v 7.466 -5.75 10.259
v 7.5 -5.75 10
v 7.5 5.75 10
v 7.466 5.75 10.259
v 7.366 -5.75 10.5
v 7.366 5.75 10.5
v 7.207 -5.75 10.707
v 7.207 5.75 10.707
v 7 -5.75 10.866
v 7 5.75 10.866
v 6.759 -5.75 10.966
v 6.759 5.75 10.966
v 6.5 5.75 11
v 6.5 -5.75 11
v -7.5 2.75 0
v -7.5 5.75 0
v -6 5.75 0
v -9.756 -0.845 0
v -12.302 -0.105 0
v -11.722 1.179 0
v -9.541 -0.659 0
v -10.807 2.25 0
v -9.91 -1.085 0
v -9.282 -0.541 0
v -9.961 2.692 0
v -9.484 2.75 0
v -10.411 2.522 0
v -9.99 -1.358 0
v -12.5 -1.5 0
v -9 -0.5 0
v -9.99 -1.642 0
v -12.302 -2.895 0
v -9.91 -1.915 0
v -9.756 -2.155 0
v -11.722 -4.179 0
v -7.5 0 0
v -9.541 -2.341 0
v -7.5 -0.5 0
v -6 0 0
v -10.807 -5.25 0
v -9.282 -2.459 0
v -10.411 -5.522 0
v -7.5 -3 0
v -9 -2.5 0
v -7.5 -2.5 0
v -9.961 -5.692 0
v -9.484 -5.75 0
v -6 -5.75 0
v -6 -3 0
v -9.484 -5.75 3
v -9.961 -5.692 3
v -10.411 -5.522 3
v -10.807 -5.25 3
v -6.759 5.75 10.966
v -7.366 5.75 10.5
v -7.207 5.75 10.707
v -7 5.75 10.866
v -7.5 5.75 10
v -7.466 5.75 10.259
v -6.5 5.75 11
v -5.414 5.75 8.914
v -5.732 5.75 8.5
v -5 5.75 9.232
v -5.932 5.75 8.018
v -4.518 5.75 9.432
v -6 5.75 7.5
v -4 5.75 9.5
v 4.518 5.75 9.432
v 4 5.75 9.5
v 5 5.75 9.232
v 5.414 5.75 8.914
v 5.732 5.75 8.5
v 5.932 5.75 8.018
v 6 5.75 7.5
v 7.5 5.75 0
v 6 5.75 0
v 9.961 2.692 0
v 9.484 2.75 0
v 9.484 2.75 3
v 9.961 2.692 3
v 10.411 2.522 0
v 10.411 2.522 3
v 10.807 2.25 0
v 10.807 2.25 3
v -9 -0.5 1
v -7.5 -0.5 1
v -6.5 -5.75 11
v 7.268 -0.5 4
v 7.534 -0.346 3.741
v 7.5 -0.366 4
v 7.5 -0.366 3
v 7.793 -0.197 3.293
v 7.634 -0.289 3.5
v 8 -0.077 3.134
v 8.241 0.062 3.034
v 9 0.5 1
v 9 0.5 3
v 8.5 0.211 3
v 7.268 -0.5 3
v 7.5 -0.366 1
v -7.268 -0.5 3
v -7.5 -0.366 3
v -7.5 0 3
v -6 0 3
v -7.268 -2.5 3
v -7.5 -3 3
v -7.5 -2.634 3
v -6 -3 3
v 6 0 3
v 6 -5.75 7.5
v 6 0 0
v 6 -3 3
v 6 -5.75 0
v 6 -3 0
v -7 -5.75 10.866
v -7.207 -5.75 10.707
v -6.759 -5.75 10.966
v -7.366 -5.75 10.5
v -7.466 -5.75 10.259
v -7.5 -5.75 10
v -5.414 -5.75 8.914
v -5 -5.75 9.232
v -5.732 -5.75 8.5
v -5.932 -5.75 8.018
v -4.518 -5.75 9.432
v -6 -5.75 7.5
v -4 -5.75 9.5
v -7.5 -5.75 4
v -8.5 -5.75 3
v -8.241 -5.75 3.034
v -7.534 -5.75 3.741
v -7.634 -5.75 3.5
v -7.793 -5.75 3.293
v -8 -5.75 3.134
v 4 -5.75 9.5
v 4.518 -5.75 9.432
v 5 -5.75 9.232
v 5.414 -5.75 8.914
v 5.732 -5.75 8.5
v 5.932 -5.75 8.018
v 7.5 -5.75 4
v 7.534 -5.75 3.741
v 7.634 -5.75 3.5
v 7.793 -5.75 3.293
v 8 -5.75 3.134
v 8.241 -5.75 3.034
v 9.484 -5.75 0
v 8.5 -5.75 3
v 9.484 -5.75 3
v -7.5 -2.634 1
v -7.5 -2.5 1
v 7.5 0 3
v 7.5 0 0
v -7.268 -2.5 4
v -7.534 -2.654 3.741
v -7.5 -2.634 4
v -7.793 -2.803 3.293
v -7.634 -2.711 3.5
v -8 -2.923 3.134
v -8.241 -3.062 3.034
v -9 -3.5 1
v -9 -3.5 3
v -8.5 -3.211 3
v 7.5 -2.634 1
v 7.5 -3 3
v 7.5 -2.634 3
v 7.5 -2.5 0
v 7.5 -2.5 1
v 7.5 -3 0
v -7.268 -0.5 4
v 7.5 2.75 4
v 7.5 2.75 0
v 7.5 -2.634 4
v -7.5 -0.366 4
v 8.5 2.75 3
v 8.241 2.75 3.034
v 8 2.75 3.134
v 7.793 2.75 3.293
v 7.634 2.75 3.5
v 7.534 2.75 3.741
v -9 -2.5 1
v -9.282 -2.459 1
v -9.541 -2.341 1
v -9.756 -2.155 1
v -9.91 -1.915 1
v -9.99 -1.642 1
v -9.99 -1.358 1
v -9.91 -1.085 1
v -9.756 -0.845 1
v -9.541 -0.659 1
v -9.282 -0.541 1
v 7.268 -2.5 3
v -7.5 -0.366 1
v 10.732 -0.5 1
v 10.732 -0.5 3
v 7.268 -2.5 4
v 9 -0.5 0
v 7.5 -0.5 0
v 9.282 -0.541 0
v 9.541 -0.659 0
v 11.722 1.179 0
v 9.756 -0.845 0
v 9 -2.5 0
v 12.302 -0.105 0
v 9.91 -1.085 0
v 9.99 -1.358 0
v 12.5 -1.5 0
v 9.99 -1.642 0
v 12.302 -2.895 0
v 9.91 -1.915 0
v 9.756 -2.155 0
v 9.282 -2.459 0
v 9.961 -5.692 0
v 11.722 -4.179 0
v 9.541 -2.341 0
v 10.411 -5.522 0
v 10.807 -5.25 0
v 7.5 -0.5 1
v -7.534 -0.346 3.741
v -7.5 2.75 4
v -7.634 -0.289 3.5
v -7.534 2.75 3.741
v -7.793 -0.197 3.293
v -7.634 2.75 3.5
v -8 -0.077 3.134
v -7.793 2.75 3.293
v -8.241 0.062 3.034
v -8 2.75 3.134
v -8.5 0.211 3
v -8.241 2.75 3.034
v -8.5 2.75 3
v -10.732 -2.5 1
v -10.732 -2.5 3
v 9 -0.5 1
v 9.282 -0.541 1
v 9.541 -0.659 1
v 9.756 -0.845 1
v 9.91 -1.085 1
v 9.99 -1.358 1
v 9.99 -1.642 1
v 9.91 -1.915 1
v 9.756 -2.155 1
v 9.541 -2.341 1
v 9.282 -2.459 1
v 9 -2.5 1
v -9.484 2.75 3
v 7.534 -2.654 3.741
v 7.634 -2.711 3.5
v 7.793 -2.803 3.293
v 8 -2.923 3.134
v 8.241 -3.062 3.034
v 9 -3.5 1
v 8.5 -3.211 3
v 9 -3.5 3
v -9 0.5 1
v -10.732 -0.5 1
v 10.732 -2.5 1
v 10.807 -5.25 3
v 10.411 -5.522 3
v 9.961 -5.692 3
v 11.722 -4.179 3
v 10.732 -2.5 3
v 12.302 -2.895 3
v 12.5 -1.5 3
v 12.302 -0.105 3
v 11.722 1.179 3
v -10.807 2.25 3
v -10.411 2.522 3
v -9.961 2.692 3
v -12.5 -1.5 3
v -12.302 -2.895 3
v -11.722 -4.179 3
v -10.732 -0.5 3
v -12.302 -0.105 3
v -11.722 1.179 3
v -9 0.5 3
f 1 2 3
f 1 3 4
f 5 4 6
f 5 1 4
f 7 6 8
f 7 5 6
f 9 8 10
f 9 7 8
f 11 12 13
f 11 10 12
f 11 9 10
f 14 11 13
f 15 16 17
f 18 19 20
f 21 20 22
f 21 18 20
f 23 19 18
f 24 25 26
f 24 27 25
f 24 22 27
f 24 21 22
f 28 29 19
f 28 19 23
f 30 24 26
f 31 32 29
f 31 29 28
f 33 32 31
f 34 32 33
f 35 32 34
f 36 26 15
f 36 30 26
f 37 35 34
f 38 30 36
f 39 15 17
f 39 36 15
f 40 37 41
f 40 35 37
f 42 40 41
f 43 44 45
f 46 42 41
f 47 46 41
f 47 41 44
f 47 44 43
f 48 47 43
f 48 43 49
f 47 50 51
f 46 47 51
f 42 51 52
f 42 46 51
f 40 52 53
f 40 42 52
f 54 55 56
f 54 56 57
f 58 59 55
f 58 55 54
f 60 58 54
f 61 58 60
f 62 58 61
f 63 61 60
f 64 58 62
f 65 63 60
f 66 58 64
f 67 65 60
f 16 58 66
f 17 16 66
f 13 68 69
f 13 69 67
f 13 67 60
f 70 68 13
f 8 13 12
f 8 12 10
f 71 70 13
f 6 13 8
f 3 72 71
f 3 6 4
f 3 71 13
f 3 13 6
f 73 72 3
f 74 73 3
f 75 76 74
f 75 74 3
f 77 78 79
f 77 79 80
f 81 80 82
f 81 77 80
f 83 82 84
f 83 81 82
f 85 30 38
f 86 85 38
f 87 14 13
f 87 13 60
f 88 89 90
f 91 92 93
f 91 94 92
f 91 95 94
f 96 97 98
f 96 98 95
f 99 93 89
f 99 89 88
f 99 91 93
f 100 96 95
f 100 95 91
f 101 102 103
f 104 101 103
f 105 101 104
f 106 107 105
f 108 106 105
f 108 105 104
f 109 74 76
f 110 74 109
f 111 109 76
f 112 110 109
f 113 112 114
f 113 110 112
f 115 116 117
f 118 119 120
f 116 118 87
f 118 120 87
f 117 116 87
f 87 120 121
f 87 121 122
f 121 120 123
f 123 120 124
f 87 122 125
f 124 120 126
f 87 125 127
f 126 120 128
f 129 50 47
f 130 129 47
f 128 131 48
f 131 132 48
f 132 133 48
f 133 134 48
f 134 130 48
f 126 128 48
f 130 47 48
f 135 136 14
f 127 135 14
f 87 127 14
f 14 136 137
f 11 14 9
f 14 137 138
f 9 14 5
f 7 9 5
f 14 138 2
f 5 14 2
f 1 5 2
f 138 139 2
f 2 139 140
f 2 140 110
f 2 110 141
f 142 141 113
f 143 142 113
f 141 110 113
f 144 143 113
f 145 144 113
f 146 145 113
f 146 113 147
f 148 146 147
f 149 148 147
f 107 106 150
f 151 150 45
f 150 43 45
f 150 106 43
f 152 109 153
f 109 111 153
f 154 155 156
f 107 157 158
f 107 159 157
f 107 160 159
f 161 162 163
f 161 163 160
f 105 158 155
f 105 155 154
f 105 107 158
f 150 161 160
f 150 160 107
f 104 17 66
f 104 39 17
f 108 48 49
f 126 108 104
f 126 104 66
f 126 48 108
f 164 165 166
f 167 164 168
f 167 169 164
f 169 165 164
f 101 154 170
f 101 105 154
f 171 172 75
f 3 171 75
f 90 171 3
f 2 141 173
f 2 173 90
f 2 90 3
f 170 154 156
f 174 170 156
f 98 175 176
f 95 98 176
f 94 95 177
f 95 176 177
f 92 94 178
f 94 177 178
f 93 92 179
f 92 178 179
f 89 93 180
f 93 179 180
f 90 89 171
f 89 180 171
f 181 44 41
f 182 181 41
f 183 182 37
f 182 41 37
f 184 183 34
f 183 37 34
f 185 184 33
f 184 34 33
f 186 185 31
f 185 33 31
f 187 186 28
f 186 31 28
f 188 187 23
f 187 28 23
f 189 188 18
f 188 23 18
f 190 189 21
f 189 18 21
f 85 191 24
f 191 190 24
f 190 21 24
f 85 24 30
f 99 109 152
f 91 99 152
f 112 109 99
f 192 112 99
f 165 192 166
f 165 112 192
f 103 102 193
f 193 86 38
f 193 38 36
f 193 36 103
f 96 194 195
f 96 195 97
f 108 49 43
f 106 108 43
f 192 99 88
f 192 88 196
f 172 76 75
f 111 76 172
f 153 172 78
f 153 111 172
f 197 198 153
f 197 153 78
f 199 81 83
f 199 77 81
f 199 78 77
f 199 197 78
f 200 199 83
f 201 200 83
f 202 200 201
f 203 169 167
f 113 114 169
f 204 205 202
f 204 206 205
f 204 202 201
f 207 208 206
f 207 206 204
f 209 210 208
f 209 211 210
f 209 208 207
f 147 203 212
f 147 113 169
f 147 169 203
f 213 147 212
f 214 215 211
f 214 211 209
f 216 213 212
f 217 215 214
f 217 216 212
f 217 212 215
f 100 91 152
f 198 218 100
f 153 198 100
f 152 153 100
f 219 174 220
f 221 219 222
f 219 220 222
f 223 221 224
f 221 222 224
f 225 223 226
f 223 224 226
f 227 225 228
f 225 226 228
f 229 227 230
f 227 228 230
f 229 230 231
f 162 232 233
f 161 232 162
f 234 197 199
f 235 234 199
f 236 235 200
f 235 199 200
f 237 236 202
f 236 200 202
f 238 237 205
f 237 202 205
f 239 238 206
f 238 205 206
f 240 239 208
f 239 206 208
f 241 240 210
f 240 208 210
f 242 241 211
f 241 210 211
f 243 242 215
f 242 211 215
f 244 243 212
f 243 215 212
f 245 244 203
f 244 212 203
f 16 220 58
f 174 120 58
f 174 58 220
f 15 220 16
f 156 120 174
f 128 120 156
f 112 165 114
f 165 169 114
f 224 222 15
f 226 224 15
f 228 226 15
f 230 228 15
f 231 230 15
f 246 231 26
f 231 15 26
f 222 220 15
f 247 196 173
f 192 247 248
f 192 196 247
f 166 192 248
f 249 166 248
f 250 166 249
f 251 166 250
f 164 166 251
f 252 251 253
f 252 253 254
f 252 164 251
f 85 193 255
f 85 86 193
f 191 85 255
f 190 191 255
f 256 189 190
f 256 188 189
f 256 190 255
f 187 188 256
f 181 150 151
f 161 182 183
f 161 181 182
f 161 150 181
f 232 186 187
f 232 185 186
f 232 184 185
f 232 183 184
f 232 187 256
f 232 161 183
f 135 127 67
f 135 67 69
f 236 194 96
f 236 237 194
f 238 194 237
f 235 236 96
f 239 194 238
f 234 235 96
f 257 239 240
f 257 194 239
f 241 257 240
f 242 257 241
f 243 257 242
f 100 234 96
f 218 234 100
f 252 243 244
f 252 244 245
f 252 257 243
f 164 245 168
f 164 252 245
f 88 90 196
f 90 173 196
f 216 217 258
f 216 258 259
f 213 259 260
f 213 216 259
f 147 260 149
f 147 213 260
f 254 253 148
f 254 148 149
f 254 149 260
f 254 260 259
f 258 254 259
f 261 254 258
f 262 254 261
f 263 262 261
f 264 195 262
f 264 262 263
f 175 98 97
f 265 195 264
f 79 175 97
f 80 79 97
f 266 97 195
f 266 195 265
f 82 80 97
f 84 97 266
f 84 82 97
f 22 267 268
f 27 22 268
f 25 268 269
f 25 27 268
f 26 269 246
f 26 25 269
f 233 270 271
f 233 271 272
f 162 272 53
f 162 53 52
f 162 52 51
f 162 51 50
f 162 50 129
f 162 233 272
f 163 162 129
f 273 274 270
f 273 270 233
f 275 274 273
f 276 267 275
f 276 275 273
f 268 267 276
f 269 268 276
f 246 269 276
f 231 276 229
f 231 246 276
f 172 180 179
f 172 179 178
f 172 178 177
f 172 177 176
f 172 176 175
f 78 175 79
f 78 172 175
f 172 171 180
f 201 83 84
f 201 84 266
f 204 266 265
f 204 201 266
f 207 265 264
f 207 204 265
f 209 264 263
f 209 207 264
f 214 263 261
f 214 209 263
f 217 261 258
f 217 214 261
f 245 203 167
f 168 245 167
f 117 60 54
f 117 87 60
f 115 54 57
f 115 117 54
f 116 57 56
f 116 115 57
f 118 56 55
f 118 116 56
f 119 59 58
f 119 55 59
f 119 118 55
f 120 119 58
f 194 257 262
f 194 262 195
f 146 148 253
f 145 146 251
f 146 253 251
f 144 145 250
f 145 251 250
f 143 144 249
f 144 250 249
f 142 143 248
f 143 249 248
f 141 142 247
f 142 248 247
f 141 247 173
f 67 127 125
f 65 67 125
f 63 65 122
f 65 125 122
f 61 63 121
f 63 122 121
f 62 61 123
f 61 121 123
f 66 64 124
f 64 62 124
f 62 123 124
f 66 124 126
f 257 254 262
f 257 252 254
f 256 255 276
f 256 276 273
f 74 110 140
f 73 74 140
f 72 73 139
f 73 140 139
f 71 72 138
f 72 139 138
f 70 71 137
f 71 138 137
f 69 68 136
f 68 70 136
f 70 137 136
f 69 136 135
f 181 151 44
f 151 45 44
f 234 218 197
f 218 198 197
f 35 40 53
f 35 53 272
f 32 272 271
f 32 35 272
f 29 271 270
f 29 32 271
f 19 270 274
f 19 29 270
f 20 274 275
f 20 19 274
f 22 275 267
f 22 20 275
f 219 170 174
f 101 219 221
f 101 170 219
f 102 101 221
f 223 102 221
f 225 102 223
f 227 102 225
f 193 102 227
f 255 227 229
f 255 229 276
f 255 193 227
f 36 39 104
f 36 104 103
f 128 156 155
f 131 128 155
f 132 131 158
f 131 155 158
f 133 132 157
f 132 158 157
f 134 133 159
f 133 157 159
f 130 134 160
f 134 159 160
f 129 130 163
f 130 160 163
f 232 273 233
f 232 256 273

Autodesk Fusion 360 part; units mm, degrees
sketch "Sketch1" plane through (0, 0, 0) normal (0, 1, 0) x (1, 0, 0)
  line L0 (-7.5, 0) -> (-6, 0)
  line L1 (-6, 0) -> (-6, -7.5)
  line L2 (-4, -9.5) -> (4, -9.5)
  line L3 (6, -7.5) -> (6, 0)
  line L4 (6, 0) -> (7.5, 0)
  line L5 (7.5, 0) -> (7.5, -10)
  line L6 (6.5, -11) -> (-6.5, -11)
  line L7 (-7.5, -10) -> (-7.5, 0)
  line L8 (0, 0) -> (0, -11)
  arc A0 (-6, -7.5) -> (-4, -9.5) centre (-4, -7.5) ccw
  arc A1 (4, -9.5) -> (6, -7.5) centre (4, -7.5) ccw
  arc A2 (-7.5, -10) -> (-6.5, -11) centre (-6.5, -10) ccw
  arc A3 (6.5, -11) -> (7.5, -10) centre (6.5, -10) ccw
  point P0 (-6, -9.5)
  point P1 (7.5, -11)
  point P2 (-7.5, -11)
  dimension "d2" = 15
  dimension "d3" = 1.5
  dimension "d6" = 2
  dimension "d7" = 2
  dimension "d8" = 1.5
  dimension "d9" = 1
  dimension "d10" = 1
  dimension "d11" = 11
extrude "Extrude1" add sketch "Sketch1" along normal mid plane 11.5
sketch "Sketch2" plane through (0, 0, 0) normal (0, 0, 1) x (1, 0, 0)
  line L0 (-7.5, -5.75) -> (-7.5, 5.75)
  line L1 (-6, -5.75) -> (-6, 5.75)
  line L2 (6, -5.75) -> (6, 5.75)
  line L3 (7.5, -5.75) -> (7.5, 5.75)
  line L4 (-7.5, 2.75) -> (7.5, 2.75) construction
  line L5 (7.5, -5.75) -> (9.4843, -5.75)
  line L6 (7.5, 2.75) -> (9.4843, 2.75)
  line L7 (-7.5, 2.75) -> (-9.4843, 2.75)
  line L8 (-7.5, -5.75) -> (-9.4843, -5.75)
  arc A0 (-10.8072, 2.25) -> (-10.8072, -5.25) centre (-7.5, -1.5) ccw
  arc A1 (10.8072, -5.25) -> (10.8072, 2.25) centre (7.5, -1.5) ccw
  line L9 (12.5, -5.75) -> (12.5, 2.75) construction
  line L10 (-12.5, -5.75) -> (-12.5, 2.75) construction
  arc A2 (-10.8072, -5.25) -> (-9.4843, -5.75) centre (-9.4843, -3.75) ccw
  arc A3 (-9.4843, 2.75) -> (-10.8072, 2.25) centre (-9.4843, 0.75) ccw
  arc A4 (10.8072, 2.25) -> (9.4843, 2.75) centre (9.4843, 0.75) ccw
  arc A5 (9.4843, -5.75) -> (10.8072, -5.25) centre (9.4843, -3.75) ccw
  dimension "d15" = 3
  dimension "d16" = 5
  dimension "d17" = 25
  dimension "d18" = 2
extrude "Extrude2" add sketch "Sketch2" along normal blind 3
fillet "Fillet1" radius 1 2 edges at (7.5, -1.5, 3) (-7.5, -1.5, 3)
sketch "Sketch3" plane through (0, 0, 0) normal (0, 0, -1) x (1, 0, 0)
  line L0 (6, 5.75) -> (6, -5.75)
  line L1 (6, -5.75) -> (7.5, -5.75)
  line L2 (7.5, -5.75) -> (7.5, -2.75)
  line L3 (7.5, -2.75) -> (9.4843, -2.75)
  arc A0 (9.4843, -2.75) -> (10.8072, -2.25) centre (9.4843, -0.75) ccw
  arc A1 (10.8072, -2.25) -> (10.8072, 5.25) centre (7.5, 1.5) ccw
  arc A2 (10.8072, 5.25) -> (9.4843, 5.75) centre (9.4843, 3.75) ccw
  line L4 (9.4843, 5.75) -> (6, 5.75)
  line L5 (6, 5.75) -> (6, -5.75)
  line L6 (7.5, -2.75) -> (7.5, -5.75)
  line L7 (9, 2.5) -> (7.5, 2.5)
  line L8 (7.5, 0.5) -> (9, 0.5)
  arc A3 (9, 0.5) -> (9, 2.5) centre (9, 1.5) ccw
  line L9 (7.5, -2.75) -> (7.5, 5.75) construction
  line L10 (7.5, 2.5) -> (7.5, 3)
  line L11 (7.5, 3) -> (6, 3)
  line L12 (7.5, 0.5) -> (7.5, 0)
  line L13 (7.5, 0) -> (6, 0)
  arc A4 (10.8072, -2.25) -> (10.8072, 5.25) centre (7.5, 1.5) ccw
  dimension "d24" = 2
  dimension "d25" = 0.5
  dimension "d26" = 1.5
extrude "Extrude3" cut sketch "Sketch3" against normal blind 1 contours L0 L5 L7 L8 A3 L10 L11 L12 L13
mirror "Mirror1" about plane through (0, 0, 0) normal (1, 0, 0) of "Extrude3"
sketch "Sketch4" plane through (0, 0, 1) normal (0, 0, -1) x (1, 0, 0)
  line L0 (-9, 0.5) -> (-7.5, 0.5)
  line L1 (-7.5, 0.5) -> (-7.5, 0)
  line L2 (-7.5, 0) -> (-6, 0)
  line L3 (-6, 0) -> (-6, 3)
  line L4 (-6, 3) -> (-7.5, 3)
  line L5 (-7.5, 3) -> (-7.5, 2.5)
  line L6 (-7.5, 2.5) -> (-9, 2.5)
  arc A0 (-9, 2.5) -> (-9, 0.5) centre (-9, 1.5) ccw
  line L7 (-6, 3) -> (-6, 0)
  line L8 (-6, 3) -> (-7.5, 3)
  line L9 (-7.5, 3) -> (-7.5, 2.5)
  line L10 (-7.5, 2.5) -> (-9, 2.5)
  arc A1 (-9, 2.5) -> (-9, 0.5) centre (-9, 1.5) ccw
  line L11 (-7.5, 0.5) -> (-7.5, 0)
  line L12 (-7.5, 3) -> (-6, 3)
  line L13 (-6, 3) -> (-6, 5.75)
  line L14 (-6, 5.75) -> (-9.4843, 5.75)
  arc A2 (-9.4843, 5.75) -> (-10.8072, 5.25) centre (-9.4843, 3.75) ccw
  arc A3 (-10.8072, 5.25) -> (-10.8072, -2.25) centre (-7.5, 1.5) ccw
  arc A4 (-10.8072, -2.25) -> (-9.4843, -2.75) centre (-9.4843, -0.75) ccw
  line L15 (-9.4843, -2.75) -> (-7.5, -2.75)
  line L16 (-7.5, -2.75) -> (-7.5, -5.75)
  line L17 (-7.5, -5.75) -> (-6, -5.75)
  line L18 (-6, -5.75) -> (-6, 0)
  line L19 (-6, 0) -> (-7.5, 0)
  line L20 (-7.5, 0) -> (-7.5, 0.5)
  line L21 (-7.5, 0.5) -> (-9, 0.5)
  arc A5 (-9, 2.5) -> (-9, 0.5) centre (-9, 1.5) ccw
  line L22 (-9, 2.5) -> (-7.5, 2.5)
  line L23 (-7.5, 2.5) -> (-7.5, 3)
  line L24 (-6, 0) -> (-7.5, 0)
  line L25 (-7.5, 3) -> (-6, 3)
  line L26 (-6, 3) -> (-6, 0)
  line L27 (-6, 0) -> (-7.5, 0)
  line L28 (-7.5, 0) -> (-7.5, 3)
extrude "Extrude4" cut sketch "Sketch4" against normal blind 2 contours L1 L2 L3 L4 L5 L7 L8 L9 L11 L12 L19 L20 L23 L24 L25 L26 L27 L28
mirror "Mirror2" about plane through (0, 0, 0) normal (1, 0, 0) of "Extrude4"
sketch "Sketch5" plane through (0, 0, 3) normal (0, 0, 1) x (-1, 0, 0)
  line L0 (-8.5, -2.75) -> (-8.5, 5.75)
  line L1 (-8.5, 5.75) -> (-9.4843, 5.75)
  arc A0 (-9.4843, 5.75) -> (-10.8072, 5.25) centre (-9.4843, 3.75) ccw
  arc A1 (-10.8072, 5.25) -> (-10.8072, -2.25) centre (-7.5, 1.5) ccw
  arc A2 (-10.8072, -2.25) -> (-9.4843, -2.75) centre (-9.4843, -0.75) ccw
  line L2 (-9.4843, -2.75) -> (-8.5, -2.75)
  line L3 (-9, -0.5) -> (-7.2679, 0.5)
  line L4 (-7.2679, 0.5) -> (-7.2679, 2.5)
  line L5 (-7.2679, 2.5) -> (-9, 3.5)
  line L6 (-9, 3.5) -> (-10.7321, 2.5)
  line L7 (-10.7321, 2.5) -> (-10.7321, 0.5)
  line L8 (-10.7321, 0.5) -> (-9, -0.5)
  arc A3 (-10.8072, 5.25) -> (-10.8072, -2.25) centre (-7.5, 1.5) ccw
  arc A4 (-9, 2.5) -> (-9, 0.5) centre (-9, 1.5) ccw
  point P0 (-9, 1.5)
  dimension "d35" = 2
extrude "Extrude5" cut sketch "Sketch5" along normal blind 1 and the other way blind 2 contours L0 L3 L5 L6 L7 L8 | L0 L3 L4 L5
mirror "Mirror3" about plane through (0, 0, 0) normal (1, 0, 0) of "Extrude5"
